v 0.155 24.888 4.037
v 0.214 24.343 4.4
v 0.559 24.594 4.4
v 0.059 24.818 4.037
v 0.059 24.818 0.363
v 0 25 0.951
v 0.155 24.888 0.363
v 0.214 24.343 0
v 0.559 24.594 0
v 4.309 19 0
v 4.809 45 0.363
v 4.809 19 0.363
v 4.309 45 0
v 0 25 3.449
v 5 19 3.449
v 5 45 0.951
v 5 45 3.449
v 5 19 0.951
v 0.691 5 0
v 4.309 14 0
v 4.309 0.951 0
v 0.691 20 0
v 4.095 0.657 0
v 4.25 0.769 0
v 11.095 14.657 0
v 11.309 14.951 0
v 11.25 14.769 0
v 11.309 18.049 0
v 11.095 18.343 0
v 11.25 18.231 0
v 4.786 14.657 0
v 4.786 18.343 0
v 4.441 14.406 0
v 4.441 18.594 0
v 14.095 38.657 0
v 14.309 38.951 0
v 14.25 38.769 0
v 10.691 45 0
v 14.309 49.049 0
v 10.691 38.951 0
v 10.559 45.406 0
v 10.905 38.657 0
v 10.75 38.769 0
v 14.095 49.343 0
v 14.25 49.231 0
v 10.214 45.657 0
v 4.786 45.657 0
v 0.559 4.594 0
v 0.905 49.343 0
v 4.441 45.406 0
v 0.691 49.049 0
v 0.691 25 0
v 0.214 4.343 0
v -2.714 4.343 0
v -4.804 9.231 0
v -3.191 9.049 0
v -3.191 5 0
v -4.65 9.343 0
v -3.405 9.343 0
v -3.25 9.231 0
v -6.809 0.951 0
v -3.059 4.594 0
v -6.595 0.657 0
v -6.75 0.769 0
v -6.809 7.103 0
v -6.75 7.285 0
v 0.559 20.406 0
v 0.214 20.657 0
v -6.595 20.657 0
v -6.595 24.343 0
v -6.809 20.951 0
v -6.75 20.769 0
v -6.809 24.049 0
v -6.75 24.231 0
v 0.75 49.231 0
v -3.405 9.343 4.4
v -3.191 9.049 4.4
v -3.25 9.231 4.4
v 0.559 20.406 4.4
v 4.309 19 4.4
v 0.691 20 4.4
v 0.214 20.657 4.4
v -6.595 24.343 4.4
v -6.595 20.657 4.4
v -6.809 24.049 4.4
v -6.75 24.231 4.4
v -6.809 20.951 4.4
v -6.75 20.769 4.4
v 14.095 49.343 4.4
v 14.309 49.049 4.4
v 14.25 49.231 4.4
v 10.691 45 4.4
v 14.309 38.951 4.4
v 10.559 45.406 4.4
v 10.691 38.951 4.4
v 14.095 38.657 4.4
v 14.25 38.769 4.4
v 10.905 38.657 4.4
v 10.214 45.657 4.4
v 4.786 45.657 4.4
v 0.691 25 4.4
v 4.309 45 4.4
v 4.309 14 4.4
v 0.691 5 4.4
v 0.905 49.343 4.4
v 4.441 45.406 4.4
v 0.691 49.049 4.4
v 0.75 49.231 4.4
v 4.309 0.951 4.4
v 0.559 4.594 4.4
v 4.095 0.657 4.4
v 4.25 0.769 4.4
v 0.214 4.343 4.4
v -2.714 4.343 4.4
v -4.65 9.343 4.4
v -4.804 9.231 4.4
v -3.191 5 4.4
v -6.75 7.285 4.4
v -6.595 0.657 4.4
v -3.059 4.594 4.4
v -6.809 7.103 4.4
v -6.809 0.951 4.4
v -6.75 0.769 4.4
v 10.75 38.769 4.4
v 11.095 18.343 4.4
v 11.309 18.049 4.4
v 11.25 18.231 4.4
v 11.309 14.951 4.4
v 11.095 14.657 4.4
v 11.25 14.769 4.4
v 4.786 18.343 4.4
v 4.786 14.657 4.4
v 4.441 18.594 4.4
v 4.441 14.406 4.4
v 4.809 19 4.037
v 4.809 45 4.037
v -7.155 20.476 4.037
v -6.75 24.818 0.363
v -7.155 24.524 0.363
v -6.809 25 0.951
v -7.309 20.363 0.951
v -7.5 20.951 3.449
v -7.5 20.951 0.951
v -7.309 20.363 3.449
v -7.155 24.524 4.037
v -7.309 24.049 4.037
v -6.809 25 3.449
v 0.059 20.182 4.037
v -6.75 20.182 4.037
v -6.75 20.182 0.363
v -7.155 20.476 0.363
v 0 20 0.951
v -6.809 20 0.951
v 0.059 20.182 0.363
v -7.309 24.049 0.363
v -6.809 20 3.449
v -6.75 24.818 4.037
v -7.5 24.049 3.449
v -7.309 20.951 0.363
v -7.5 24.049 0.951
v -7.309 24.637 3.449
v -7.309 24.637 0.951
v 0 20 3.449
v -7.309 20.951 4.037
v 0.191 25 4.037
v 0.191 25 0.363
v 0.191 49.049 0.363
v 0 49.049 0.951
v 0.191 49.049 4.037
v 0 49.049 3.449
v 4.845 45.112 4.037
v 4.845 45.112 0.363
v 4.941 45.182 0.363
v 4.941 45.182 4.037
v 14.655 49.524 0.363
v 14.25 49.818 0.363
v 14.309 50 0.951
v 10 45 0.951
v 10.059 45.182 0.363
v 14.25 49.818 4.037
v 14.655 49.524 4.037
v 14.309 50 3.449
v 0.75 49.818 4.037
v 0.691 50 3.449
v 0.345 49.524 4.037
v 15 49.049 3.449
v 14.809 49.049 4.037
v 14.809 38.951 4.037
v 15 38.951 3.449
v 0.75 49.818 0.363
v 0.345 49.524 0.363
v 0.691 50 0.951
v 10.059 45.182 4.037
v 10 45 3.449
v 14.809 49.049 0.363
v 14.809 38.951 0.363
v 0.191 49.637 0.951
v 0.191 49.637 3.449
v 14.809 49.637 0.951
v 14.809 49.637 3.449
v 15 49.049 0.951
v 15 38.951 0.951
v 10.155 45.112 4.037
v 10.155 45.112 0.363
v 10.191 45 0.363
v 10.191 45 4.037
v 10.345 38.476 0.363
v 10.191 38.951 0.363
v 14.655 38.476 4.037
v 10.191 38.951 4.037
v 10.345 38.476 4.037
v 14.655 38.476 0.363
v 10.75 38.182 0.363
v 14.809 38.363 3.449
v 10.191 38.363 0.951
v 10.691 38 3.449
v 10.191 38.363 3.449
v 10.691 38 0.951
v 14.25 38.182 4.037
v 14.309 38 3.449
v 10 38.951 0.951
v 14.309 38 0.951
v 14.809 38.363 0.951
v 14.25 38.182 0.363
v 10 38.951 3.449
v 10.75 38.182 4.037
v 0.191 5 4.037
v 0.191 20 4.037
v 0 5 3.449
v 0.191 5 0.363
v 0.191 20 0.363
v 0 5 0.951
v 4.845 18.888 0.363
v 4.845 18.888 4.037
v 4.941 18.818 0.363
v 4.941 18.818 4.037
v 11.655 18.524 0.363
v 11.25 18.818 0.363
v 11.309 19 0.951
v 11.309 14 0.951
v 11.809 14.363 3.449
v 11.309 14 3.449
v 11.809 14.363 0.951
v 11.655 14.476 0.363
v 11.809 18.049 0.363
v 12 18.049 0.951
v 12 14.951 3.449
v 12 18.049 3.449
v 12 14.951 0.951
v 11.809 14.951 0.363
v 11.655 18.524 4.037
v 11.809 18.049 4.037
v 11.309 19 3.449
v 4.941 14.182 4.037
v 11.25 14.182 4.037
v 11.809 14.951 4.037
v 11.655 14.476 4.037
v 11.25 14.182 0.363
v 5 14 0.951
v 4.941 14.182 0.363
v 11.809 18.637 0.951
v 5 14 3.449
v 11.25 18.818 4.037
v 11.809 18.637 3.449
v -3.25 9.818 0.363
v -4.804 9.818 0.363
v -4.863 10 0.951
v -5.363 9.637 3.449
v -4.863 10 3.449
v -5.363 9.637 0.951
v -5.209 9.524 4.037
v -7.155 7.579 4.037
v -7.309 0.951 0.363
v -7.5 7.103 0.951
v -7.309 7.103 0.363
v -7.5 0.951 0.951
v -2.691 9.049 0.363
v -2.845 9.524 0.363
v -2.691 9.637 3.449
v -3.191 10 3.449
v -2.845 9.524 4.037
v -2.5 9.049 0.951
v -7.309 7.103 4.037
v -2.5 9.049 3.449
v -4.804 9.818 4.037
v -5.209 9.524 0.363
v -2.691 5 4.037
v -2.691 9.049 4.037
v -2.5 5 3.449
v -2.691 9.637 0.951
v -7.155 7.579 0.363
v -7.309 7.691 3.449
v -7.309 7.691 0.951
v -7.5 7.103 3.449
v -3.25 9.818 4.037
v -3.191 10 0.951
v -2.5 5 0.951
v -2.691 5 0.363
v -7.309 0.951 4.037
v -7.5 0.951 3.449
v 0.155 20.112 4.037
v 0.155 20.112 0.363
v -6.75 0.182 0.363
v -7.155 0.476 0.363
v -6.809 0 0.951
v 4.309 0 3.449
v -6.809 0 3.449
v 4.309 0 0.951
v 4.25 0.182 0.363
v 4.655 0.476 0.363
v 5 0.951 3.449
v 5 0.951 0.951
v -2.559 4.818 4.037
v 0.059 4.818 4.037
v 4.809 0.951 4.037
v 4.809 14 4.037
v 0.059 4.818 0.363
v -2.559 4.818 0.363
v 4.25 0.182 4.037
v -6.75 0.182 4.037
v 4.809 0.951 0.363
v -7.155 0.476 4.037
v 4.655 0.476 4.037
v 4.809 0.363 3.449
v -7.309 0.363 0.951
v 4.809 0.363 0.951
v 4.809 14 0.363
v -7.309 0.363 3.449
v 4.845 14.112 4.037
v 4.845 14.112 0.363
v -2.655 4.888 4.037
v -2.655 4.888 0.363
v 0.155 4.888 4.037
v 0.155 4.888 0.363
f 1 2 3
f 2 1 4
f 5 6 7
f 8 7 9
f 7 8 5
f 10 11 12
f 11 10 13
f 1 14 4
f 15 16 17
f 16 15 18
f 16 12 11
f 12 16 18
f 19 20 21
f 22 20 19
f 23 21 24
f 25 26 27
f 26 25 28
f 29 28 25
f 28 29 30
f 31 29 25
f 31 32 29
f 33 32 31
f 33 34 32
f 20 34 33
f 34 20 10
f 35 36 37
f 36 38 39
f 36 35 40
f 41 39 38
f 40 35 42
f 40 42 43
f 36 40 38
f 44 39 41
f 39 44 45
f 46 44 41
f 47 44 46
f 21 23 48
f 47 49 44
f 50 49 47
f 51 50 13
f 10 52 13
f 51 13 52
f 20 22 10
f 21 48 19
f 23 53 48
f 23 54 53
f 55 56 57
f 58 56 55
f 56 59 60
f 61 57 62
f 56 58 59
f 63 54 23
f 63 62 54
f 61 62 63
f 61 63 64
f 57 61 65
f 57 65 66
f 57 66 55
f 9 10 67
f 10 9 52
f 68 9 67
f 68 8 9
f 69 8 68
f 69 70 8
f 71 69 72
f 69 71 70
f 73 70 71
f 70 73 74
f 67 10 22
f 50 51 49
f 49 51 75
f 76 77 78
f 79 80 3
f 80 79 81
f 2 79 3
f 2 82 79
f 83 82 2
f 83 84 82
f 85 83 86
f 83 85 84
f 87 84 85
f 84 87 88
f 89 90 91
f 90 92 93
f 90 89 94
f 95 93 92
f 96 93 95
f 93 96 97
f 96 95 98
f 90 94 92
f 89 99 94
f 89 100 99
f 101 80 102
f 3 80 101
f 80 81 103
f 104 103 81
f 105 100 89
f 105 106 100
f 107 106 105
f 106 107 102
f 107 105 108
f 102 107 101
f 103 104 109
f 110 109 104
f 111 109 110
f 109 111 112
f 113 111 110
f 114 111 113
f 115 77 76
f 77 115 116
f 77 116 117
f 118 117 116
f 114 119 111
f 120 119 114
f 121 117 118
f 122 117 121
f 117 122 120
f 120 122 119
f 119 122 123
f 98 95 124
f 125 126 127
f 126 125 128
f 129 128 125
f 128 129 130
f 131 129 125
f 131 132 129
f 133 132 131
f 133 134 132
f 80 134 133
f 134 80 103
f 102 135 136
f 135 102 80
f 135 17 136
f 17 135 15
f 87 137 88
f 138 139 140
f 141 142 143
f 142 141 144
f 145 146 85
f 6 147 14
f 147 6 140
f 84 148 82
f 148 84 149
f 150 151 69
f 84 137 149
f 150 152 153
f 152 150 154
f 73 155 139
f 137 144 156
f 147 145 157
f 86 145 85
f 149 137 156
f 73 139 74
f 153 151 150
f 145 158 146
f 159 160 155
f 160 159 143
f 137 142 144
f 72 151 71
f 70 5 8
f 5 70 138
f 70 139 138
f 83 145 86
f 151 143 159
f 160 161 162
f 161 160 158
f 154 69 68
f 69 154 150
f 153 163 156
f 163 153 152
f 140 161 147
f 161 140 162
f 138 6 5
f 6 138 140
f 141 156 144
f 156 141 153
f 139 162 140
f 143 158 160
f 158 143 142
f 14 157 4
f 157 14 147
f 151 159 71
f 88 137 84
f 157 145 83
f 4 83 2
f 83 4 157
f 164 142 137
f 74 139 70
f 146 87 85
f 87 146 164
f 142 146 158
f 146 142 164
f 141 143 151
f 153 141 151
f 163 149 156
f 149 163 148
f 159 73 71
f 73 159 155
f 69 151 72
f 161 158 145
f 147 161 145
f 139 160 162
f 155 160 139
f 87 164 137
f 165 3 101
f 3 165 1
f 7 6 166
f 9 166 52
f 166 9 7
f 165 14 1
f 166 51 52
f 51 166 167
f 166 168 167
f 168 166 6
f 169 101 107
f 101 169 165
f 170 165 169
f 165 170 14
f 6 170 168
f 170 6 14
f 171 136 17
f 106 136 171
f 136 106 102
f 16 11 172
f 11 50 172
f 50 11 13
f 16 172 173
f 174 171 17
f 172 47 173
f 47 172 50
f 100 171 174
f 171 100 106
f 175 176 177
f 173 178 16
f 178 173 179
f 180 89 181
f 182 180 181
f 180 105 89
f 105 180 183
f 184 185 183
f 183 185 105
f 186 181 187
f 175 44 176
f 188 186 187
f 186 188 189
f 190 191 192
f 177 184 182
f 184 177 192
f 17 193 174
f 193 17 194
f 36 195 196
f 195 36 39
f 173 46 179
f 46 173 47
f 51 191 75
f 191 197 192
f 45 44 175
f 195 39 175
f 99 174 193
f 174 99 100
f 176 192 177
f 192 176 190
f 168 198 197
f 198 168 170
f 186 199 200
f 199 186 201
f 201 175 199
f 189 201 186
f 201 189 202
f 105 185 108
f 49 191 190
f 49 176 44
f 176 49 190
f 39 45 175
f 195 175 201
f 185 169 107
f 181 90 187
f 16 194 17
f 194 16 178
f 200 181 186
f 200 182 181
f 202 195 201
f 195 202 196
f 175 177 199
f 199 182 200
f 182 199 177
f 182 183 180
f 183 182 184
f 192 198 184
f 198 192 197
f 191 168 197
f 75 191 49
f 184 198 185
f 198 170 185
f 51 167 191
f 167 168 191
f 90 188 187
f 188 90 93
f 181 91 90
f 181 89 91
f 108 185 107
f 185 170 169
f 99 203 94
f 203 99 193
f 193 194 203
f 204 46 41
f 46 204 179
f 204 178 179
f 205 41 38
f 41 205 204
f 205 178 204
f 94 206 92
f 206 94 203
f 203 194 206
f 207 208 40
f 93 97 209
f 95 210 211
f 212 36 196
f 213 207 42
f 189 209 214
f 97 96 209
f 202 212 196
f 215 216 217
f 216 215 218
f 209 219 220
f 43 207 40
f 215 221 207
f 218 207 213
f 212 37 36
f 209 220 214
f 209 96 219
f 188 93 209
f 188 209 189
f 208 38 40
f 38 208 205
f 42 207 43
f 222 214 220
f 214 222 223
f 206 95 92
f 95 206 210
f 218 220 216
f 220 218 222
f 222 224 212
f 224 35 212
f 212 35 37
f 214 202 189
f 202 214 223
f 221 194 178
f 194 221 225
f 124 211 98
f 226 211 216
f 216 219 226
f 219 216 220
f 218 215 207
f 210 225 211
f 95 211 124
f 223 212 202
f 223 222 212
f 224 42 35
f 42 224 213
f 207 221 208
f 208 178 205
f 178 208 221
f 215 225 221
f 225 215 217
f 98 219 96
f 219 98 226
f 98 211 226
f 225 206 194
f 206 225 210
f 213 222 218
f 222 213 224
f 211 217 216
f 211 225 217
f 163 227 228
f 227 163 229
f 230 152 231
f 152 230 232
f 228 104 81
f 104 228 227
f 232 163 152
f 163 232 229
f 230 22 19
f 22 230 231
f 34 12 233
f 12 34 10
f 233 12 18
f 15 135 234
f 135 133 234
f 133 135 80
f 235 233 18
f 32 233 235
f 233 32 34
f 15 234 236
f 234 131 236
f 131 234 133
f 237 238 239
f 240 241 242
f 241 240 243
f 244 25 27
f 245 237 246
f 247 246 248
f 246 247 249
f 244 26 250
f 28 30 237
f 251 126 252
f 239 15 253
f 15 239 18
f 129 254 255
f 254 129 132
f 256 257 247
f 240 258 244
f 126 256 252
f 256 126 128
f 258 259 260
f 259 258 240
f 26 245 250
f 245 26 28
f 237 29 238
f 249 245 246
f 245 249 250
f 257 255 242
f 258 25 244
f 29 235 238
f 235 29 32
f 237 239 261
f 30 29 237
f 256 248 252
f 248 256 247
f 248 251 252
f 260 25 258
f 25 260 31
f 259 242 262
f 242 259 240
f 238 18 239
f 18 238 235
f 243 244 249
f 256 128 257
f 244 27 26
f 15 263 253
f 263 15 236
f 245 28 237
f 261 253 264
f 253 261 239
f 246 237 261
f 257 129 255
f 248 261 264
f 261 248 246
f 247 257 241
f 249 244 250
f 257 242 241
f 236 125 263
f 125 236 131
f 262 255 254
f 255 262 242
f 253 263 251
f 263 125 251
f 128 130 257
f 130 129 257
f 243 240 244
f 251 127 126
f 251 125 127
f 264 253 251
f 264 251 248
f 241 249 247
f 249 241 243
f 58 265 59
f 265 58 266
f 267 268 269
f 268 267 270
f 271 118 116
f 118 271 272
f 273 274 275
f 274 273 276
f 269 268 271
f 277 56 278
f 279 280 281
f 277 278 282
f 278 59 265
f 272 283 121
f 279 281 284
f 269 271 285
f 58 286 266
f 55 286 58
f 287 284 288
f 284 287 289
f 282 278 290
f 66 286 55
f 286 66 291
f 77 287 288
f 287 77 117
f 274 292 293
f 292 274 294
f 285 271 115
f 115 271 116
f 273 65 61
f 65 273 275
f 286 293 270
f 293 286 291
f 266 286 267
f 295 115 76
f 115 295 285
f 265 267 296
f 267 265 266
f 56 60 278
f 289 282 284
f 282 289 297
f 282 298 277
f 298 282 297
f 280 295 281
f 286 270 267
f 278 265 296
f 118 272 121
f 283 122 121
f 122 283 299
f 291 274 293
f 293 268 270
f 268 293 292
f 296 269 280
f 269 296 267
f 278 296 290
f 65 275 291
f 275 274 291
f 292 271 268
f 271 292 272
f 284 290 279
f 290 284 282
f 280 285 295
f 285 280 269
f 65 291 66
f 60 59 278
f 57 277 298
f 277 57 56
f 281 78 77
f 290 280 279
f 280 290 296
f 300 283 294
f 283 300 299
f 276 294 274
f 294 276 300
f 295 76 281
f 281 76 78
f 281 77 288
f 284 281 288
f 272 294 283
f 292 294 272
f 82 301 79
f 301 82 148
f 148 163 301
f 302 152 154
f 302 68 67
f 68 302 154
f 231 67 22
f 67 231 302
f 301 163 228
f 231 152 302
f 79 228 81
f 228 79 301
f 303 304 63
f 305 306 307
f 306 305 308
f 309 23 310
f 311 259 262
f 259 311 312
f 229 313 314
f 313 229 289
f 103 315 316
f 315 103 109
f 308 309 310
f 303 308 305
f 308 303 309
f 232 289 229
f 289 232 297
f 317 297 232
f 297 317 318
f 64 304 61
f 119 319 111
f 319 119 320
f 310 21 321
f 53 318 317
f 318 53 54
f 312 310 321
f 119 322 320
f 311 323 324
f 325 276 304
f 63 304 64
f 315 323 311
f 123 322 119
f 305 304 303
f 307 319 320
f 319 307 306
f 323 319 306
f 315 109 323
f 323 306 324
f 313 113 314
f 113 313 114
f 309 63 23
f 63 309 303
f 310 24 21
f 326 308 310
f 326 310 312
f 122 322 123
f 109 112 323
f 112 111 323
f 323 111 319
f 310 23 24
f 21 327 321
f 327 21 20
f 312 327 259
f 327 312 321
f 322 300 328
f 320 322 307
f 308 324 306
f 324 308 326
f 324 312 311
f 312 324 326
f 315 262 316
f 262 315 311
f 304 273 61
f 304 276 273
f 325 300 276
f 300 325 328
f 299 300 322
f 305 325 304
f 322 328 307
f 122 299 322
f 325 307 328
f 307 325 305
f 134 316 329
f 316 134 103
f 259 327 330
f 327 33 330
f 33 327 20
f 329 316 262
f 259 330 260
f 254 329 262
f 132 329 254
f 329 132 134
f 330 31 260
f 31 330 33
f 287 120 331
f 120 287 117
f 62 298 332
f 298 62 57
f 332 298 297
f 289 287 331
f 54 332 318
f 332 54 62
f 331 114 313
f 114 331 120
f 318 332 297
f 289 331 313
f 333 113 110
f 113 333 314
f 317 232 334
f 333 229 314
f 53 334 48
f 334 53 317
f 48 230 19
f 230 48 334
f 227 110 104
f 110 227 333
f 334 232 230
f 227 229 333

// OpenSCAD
// file: Skadis_Hook_redo.scad
/* [Hidden] */
$fn = 10;

CLIP_HEIGHT = 12;
CLIP_PIN_INNER_DISTANCE = 26;
PIN_LENGTH = 7;

BASE_WIDTH = 4.4;
BASE_DEPTH = 5;

/* [Base] */
// Height of the base.
BASE_HEIGHT = 50; // [36:100]

/* [Hook] */
// Enable Smooth Edges.
ENABLE_SMOOTH_EDGES = true;
// Make the hook a bit prettier.
ENABLE_HOOK_NICE = true;
// Length (horizontal size) of the hook.
HOOK_SIZE_H = 15; // [1:100]
// Height (vertical size) of the hook.
HOOK_SIZE_V = 10; // [0:50]
// Vertical rotation of the hook.
HOOK_ROTATION = 0; // [0:90]


minkowskiOutsideRound(1, ENABLE_SMOOTH_EDGES) {
	hook(
		base_height = BASE_HEIGHT,
		base_width = BASE_WIDTH,
		base_depth = BASE_DEPTH,
		clip_height = CLIP_HEIGHT,
		clip_pin_distance = CLIP_PIN_INNER_DISTANCE,
		pin_length = PIN_LENGTH,
		hook_size_h = HOOK_SIZE_H,
		hook_size_v = HOOK_SIZE_V,
		hook_nice = ENABLE_HOOK_NICE,
		hook_rotation = HOOK_ROTATION
	);
}


module hook(
	base_height = 50,
	base_width = 4.4,
	base_depth = 5,
	clip_height = 12,
	clip_pin_distance = 19,
	pin_length = 7,
	hook_size_h = 15,
	hook_size_v = 5,
	hook_nice = true,
	hook_rotation = 0,
) {
	// Base
	cube(size=[base_depth, base_height, base_width]);

	// Clip, Top
	translate([base_depth, base_height-base_depth, 0]) {
		cube(size=[base_depth, base_depth, base_width]);
	}

	// Clip, Back
	translate([base_depth*2, base_height-clip_height, 0]) {
		cube(size=[base_depth, clip_height, base_width]);
	}

	// Pin
	translate([base_depth, base_height-2*base_depth-clip_pin_distance, 0]) {
		cube(size=[7, base_depth, base_width]);
	}

	// Hook, Horizontal
	translate([-(hook_size_h-base_depth), 0, 0]) {
		cube(size=[hook_size_h-base_depth, base_depth, base_width]);
	}
	
	// Adding new Hooks
	// Hook, Horizontal 2
	translate([-(hook_size_h-base_depth), 20, 0]) {
		cube(size=[hook_size_h-base_depth, base_depth, base_width]);
	}

	// Hook, Vertical
	if (hook_size_h > 0) {
		translate([-(hook_size_h-base_depth), 0, 0]) {
			rotate([0, 0, hook_rotation]) {
				difference() {
					cube(size=[base_depth, base_depth+hook_size_v, base_width]);
					
					if (hook_nice == true) {
						translate([0, hook_size_v+base_depth/2, -1]) {
							rotate([0, 0, 45]) {
							cube(size=[base_depth, base_depth, base_width+2]);
							}
						}
					}
				}
			}
		}
	}
}

// Library: MinkowskiRound.scad
// Version: 1.0
// Author: IrevDev
// Copyright: 2017
// License: LGPL 2.1 or later
// Url: https://github.com/Irev-Dev/Round-Anything

module minkowskiOutsideRound(r=1,enable=true,cubeSize=[500,500,500]){
    if(enable==false){//do nothing if not enabled
        children();
    } else {
        minkowski(){//expand the now positive shape
            difference(){//make the negative positive
                cube(cubeSize-[0.1,0.1,0.1],center=true);
                minkowski(){//expand the negative inwards
                    difference(){//create a negative of the children
                        cube(cubeSize,center=true);
                        children();
                    }
                    sphere(r);
                }
            }
            sphere(r);
        }
    }
}
// main file
use <Skadis_Hook_redo.scad>

		my_negativ_hook();
/*
difference() 
{
	
	controller_holder();
	
	scale(v = 1.01) 
		my_negativ_hook();
}
*/
module controller_holder() {
	translate([-109, -64, -9.0]) 
	{
		rotate([0, 0, -64 +180]) 
		{
			import("include_stls/DualShock4_Mount_w_chargehole.stl");
		}
	} 
}


/* [Hidden] */
$fn = 5;

CLIP_HEIGHT = 12;
CLIP_PIN_INNER_DISTANCE = 26;
PIN_LENGTH = 7;

BASE_WIDTH = 4.4;
BASE_DEPTH = 5;

/* [Base] */
// Height of the base.
BASE_HEIGHT = 50; // [36:100]

/* [Hook] */
// Enable Smooth Edges.
ENABLE_SMOOTH_EDGES = true;
// Make the hook a bit prettier.
ENABLE_HOOK_NICE = true;
// Length (horizontal size) of the hook.
HOOK_SIZE_H = 12.5; // [11:100]
// Height (vertical size) of the hook.
HOOK_SIZE_V = 5; // [0:50]
// Vertical rotation of the hook.
HOOK_ROTATION = 0; // [0:90]

// 
SHIFT_OF_HOOK_2 = 20;

module my_negativ_hook() {
	minkowskiOutsideRound(1, ENABLE_SMOOTH_EDGES) {
		hook(
			base_height = BASE_HEIGHT,
			base_width = BASE_WIDTH,
			base_depth = BASE_DEPTH,
			clip_height = CLIP_HEIGHT,
			clip_pin_distance = CLIP_PIN_INNER_DISTANCE,
			pin_length = PIN_LENGTH,
			hook_size_h = HOOK_SIZE_H,
			hook_size_v = HOOK_SIZE_V,
			hook_nice = ENABLE_HOOK_NICE,
			hook_rotation = HOOK_ROTATION
		);
	}
}
